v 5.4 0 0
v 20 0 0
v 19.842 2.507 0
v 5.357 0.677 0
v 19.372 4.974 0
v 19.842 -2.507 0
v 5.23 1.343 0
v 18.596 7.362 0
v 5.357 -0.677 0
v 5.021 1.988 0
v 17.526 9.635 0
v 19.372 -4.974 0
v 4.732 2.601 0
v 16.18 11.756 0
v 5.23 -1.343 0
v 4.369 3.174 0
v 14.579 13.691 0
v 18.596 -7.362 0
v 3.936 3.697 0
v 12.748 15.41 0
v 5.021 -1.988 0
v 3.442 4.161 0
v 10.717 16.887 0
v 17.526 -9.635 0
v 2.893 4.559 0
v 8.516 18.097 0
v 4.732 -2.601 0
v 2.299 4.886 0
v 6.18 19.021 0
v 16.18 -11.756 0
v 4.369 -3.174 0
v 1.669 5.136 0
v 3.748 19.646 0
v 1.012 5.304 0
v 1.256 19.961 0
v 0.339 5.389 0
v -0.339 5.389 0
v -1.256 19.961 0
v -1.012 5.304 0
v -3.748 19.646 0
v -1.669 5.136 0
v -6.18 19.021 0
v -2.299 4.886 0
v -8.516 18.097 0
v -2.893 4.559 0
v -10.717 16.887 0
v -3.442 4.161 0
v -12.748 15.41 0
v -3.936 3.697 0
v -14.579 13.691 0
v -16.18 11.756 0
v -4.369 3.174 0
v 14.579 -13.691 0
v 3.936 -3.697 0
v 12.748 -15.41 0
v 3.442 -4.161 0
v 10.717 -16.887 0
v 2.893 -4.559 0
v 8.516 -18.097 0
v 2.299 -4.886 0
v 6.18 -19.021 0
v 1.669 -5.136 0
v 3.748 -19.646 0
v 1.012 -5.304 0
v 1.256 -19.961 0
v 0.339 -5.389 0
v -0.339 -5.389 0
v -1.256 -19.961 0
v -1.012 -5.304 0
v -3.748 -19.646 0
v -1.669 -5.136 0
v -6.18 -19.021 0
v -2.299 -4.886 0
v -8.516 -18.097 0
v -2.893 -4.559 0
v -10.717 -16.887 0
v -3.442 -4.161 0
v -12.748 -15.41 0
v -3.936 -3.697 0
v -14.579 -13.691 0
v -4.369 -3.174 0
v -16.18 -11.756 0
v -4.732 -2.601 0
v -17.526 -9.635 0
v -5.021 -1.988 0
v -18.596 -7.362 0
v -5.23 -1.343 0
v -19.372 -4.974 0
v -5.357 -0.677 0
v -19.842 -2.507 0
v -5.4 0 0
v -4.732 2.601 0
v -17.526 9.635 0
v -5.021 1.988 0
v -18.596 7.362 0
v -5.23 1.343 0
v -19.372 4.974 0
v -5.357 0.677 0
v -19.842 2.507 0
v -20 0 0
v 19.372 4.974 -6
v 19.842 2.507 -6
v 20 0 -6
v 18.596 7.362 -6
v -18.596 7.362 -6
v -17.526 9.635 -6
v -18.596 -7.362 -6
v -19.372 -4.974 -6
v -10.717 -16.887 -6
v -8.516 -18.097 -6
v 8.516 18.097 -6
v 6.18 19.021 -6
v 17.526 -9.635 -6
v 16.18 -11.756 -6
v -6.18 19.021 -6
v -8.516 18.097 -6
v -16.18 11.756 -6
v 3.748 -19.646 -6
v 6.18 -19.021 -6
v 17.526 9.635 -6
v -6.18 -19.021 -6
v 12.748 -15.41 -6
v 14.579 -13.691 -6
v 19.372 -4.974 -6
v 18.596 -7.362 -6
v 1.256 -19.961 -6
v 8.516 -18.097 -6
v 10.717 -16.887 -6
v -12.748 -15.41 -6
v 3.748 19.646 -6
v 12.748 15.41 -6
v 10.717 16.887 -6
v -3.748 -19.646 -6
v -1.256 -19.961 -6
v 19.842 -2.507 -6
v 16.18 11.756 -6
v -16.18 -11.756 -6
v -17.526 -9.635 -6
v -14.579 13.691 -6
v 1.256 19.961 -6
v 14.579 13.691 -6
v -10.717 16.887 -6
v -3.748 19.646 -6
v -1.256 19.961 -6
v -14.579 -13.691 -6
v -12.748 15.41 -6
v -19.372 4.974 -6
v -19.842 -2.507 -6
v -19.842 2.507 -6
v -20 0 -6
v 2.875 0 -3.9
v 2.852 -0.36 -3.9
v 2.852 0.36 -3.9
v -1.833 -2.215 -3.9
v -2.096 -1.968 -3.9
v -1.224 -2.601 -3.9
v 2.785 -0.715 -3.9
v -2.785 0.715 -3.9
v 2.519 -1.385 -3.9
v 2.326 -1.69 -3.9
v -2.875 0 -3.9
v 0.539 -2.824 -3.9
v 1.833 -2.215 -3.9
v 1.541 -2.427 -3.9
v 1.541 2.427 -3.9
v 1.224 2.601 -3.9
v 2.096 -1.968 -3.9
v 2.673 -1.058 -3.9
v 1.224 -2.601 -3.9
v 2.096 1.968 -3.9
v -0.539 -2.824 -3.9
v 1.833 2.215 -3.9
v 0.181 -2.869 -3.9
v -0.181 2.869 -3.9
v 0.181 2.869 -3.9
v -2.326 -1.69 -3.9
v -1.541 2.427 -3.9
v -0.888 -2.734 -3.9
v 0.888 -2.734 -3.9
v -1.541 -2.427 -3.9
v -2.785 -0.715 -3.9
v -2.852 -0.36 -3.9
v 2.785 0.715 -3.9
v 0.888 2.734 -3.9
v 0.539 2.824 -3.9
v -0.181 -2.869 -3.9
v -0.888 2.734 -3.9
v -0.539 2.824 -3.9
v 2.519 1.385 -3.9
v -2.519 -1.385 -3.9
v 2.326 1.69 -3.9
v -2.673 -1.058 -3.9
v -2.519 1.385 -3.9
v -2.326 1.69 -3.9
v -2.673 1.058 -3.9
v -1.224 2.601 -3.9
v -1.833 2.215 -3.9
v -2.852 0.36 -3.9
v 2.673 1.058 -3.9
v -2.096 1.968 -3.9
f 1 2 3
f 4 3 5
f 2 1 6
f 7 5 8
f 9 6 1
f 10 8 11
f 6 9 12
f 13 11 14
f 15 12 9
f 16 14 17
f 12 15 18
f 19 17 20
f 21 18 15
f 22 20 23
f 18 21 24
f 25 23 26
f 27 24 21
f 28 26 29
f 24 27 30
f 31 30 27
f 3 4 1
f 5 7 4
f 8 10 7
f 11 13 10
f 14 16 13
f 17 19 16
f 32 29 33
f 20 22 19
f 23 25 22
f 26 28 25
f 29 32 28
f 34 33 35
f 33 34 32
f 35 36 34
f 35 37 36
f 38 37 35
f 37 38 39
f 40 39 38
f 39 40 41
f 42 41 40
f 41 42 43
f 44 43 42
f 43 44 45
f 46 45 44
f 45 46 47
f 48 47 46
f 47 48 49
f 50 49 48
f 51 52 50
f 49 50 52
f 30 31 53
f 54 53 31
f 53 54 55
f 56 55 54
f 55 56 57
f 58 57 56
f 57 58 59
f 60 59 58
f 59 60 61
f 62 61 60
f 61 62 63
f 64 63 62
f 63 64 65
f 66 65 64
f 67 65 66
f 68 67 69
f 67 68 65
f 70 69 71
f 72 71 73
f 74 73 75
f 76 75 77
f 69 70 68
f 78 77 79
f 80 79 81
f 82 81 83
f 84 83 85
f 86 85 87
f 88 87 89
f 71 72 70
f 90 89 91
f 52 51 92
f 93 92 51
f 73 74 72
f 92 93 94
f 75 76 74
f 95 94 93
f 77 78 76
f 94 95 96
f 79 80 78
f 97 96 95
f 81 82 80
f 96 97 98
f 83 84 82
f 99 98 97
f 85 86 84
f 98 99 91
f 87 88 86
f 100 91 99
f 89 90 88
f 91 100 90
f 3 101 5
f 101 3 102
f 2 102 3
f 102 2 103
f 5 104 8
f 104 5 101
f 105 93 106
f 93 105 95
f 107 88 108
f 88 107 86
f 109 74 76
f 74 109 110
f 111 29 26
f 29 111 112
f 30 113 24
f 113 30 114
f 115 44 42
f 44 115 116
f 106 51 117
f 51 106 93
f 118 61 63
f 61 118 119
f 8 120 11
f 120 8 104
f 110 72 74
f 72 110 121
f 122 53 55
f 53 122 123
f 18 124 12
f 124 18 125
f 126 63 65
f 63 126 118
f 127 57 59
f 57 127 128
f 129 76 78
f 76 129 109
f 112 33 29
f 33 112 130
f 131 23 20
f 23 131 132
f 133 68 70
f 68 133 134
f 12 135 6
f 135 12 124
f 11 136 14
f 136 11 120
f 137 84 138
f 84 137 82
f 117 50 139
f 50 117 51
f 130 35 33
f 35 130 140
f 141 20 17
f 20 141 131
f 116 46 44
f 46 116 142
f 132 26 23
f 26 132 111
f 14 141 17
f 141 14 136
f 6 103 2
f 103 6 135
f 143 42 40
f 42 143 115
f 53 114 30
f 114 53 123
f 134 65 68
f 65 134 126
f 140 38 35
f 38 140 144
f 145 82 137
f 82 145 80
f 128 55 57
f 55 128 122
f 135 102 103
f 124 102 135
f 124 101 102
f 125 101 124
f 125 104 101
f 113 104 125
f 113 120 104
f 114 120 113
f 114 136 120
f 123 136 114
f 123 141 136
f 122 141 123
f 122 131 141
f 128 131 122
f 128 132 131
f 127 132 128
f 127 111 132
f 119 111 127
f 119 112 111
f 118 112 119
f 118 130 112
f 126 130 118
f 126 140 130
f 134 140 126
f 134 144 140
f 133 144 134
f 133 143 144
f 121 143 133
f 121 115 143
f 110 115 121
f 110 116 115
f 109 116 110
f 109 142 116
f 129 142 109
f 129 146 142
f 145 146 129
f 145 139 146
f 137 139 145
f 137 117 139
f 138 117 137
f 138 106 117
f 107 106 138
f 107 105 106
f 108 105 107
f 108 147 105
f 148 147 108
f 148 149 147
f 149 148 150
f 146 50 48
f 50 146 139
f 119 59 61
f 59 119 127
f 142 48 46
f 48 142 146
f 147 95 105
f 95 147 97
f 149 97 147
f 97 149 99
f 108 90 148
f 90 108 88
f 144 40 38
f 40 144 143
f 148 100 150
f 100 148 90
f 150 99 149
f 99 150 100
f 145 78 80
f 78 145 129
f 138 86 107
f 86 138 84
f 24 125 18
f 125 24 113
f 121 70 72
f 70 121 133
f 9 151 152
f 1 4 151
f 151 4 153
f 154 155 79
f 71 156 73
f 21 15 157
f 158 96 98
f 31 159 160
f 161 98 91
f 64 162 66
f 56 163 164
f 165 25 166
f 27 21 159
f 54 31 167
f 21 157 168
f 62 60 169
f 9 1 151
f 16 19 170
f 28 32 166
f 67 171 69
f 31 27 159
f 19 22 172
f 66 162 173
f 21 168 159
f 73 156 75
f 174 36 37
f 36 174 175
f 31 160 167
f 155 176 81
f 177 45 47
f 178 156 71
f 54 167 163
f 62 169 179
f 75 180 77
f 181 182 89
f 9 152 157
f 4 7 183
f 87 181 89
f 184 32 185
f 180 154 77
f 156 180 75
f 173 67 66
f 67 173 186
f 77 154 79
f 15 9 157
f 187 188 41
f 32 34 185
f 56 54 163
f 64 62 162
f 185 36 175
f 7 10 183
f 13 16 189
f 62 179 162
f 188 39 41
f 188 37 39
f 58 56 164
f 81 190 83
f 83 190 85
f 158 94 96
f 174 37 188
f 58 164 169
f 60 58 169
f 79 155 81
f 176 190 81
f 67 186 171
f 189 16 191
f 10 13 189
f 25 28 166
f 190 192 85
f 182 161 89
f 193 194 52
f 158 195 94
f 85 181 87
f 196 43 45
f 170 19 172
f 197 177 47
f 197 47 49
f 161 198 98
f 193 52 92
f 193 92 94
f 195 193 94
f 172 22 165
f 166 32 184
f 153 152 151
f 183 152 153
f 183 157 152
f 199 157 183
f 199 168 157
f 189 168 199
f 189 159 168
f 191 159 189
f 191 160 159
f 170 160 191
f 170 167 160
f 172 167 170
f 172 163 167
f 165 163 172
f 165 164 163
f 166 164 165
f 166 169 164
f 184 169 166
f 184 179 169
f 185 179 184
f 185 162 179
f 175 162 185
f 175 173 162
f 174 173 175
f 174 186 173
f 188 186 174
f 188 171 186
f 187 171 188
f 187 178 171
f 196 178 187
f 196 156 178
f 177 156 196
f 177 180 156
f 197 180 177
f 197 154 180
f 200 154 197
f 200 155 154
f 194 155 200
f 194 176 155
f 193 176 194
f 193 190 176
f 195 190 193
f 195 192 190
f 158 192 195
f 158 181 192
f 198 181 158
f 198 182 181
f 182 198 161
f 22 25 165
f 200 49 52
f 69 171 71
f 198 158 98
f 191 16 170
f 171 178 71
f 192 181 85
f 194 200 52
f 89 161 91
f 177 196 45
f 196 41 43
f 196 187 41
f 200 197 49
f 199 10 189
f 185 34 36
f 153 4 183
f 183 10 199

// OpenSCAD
$fn = 50;


difference() {
	union() {
		translate(v = [0, 0, -3.0000000000]) {
			cylinder(h = 3, r = 10.0000000000);
		}
		translate(v = [0, 0, -6.0000000000]) {
			cylinder(h = 6, r = 20.0000000000);
		}
	}
	union() {
		translate(v = [0, 0, 0]) {
			rotate(a = [0, 0, 0]) {
				difference() {
					union() {
						#translate(v = [0, 0, -3.0000000000]) {
							cylinder(h = 3, r = 2.6000000000);
						}
						#translate(v = [0, 0, -3.9000000000]) {
							cylinder(h = 3.9000000000, r = 10.0000000000, r1 = 2.8750000000, r2 = 5.4000000000);
						}
						#translate(v = [0, 0, -3.0000000000]) {
							cylinder(h = 3, r = 2.8750000000);
						}
						#translate(v = [0, 0, -3.0000000000]) {
							cylinder(h = 3, r = 2.6000000000);
						}
					}
					union();
				}
			}
		}
	}
}
